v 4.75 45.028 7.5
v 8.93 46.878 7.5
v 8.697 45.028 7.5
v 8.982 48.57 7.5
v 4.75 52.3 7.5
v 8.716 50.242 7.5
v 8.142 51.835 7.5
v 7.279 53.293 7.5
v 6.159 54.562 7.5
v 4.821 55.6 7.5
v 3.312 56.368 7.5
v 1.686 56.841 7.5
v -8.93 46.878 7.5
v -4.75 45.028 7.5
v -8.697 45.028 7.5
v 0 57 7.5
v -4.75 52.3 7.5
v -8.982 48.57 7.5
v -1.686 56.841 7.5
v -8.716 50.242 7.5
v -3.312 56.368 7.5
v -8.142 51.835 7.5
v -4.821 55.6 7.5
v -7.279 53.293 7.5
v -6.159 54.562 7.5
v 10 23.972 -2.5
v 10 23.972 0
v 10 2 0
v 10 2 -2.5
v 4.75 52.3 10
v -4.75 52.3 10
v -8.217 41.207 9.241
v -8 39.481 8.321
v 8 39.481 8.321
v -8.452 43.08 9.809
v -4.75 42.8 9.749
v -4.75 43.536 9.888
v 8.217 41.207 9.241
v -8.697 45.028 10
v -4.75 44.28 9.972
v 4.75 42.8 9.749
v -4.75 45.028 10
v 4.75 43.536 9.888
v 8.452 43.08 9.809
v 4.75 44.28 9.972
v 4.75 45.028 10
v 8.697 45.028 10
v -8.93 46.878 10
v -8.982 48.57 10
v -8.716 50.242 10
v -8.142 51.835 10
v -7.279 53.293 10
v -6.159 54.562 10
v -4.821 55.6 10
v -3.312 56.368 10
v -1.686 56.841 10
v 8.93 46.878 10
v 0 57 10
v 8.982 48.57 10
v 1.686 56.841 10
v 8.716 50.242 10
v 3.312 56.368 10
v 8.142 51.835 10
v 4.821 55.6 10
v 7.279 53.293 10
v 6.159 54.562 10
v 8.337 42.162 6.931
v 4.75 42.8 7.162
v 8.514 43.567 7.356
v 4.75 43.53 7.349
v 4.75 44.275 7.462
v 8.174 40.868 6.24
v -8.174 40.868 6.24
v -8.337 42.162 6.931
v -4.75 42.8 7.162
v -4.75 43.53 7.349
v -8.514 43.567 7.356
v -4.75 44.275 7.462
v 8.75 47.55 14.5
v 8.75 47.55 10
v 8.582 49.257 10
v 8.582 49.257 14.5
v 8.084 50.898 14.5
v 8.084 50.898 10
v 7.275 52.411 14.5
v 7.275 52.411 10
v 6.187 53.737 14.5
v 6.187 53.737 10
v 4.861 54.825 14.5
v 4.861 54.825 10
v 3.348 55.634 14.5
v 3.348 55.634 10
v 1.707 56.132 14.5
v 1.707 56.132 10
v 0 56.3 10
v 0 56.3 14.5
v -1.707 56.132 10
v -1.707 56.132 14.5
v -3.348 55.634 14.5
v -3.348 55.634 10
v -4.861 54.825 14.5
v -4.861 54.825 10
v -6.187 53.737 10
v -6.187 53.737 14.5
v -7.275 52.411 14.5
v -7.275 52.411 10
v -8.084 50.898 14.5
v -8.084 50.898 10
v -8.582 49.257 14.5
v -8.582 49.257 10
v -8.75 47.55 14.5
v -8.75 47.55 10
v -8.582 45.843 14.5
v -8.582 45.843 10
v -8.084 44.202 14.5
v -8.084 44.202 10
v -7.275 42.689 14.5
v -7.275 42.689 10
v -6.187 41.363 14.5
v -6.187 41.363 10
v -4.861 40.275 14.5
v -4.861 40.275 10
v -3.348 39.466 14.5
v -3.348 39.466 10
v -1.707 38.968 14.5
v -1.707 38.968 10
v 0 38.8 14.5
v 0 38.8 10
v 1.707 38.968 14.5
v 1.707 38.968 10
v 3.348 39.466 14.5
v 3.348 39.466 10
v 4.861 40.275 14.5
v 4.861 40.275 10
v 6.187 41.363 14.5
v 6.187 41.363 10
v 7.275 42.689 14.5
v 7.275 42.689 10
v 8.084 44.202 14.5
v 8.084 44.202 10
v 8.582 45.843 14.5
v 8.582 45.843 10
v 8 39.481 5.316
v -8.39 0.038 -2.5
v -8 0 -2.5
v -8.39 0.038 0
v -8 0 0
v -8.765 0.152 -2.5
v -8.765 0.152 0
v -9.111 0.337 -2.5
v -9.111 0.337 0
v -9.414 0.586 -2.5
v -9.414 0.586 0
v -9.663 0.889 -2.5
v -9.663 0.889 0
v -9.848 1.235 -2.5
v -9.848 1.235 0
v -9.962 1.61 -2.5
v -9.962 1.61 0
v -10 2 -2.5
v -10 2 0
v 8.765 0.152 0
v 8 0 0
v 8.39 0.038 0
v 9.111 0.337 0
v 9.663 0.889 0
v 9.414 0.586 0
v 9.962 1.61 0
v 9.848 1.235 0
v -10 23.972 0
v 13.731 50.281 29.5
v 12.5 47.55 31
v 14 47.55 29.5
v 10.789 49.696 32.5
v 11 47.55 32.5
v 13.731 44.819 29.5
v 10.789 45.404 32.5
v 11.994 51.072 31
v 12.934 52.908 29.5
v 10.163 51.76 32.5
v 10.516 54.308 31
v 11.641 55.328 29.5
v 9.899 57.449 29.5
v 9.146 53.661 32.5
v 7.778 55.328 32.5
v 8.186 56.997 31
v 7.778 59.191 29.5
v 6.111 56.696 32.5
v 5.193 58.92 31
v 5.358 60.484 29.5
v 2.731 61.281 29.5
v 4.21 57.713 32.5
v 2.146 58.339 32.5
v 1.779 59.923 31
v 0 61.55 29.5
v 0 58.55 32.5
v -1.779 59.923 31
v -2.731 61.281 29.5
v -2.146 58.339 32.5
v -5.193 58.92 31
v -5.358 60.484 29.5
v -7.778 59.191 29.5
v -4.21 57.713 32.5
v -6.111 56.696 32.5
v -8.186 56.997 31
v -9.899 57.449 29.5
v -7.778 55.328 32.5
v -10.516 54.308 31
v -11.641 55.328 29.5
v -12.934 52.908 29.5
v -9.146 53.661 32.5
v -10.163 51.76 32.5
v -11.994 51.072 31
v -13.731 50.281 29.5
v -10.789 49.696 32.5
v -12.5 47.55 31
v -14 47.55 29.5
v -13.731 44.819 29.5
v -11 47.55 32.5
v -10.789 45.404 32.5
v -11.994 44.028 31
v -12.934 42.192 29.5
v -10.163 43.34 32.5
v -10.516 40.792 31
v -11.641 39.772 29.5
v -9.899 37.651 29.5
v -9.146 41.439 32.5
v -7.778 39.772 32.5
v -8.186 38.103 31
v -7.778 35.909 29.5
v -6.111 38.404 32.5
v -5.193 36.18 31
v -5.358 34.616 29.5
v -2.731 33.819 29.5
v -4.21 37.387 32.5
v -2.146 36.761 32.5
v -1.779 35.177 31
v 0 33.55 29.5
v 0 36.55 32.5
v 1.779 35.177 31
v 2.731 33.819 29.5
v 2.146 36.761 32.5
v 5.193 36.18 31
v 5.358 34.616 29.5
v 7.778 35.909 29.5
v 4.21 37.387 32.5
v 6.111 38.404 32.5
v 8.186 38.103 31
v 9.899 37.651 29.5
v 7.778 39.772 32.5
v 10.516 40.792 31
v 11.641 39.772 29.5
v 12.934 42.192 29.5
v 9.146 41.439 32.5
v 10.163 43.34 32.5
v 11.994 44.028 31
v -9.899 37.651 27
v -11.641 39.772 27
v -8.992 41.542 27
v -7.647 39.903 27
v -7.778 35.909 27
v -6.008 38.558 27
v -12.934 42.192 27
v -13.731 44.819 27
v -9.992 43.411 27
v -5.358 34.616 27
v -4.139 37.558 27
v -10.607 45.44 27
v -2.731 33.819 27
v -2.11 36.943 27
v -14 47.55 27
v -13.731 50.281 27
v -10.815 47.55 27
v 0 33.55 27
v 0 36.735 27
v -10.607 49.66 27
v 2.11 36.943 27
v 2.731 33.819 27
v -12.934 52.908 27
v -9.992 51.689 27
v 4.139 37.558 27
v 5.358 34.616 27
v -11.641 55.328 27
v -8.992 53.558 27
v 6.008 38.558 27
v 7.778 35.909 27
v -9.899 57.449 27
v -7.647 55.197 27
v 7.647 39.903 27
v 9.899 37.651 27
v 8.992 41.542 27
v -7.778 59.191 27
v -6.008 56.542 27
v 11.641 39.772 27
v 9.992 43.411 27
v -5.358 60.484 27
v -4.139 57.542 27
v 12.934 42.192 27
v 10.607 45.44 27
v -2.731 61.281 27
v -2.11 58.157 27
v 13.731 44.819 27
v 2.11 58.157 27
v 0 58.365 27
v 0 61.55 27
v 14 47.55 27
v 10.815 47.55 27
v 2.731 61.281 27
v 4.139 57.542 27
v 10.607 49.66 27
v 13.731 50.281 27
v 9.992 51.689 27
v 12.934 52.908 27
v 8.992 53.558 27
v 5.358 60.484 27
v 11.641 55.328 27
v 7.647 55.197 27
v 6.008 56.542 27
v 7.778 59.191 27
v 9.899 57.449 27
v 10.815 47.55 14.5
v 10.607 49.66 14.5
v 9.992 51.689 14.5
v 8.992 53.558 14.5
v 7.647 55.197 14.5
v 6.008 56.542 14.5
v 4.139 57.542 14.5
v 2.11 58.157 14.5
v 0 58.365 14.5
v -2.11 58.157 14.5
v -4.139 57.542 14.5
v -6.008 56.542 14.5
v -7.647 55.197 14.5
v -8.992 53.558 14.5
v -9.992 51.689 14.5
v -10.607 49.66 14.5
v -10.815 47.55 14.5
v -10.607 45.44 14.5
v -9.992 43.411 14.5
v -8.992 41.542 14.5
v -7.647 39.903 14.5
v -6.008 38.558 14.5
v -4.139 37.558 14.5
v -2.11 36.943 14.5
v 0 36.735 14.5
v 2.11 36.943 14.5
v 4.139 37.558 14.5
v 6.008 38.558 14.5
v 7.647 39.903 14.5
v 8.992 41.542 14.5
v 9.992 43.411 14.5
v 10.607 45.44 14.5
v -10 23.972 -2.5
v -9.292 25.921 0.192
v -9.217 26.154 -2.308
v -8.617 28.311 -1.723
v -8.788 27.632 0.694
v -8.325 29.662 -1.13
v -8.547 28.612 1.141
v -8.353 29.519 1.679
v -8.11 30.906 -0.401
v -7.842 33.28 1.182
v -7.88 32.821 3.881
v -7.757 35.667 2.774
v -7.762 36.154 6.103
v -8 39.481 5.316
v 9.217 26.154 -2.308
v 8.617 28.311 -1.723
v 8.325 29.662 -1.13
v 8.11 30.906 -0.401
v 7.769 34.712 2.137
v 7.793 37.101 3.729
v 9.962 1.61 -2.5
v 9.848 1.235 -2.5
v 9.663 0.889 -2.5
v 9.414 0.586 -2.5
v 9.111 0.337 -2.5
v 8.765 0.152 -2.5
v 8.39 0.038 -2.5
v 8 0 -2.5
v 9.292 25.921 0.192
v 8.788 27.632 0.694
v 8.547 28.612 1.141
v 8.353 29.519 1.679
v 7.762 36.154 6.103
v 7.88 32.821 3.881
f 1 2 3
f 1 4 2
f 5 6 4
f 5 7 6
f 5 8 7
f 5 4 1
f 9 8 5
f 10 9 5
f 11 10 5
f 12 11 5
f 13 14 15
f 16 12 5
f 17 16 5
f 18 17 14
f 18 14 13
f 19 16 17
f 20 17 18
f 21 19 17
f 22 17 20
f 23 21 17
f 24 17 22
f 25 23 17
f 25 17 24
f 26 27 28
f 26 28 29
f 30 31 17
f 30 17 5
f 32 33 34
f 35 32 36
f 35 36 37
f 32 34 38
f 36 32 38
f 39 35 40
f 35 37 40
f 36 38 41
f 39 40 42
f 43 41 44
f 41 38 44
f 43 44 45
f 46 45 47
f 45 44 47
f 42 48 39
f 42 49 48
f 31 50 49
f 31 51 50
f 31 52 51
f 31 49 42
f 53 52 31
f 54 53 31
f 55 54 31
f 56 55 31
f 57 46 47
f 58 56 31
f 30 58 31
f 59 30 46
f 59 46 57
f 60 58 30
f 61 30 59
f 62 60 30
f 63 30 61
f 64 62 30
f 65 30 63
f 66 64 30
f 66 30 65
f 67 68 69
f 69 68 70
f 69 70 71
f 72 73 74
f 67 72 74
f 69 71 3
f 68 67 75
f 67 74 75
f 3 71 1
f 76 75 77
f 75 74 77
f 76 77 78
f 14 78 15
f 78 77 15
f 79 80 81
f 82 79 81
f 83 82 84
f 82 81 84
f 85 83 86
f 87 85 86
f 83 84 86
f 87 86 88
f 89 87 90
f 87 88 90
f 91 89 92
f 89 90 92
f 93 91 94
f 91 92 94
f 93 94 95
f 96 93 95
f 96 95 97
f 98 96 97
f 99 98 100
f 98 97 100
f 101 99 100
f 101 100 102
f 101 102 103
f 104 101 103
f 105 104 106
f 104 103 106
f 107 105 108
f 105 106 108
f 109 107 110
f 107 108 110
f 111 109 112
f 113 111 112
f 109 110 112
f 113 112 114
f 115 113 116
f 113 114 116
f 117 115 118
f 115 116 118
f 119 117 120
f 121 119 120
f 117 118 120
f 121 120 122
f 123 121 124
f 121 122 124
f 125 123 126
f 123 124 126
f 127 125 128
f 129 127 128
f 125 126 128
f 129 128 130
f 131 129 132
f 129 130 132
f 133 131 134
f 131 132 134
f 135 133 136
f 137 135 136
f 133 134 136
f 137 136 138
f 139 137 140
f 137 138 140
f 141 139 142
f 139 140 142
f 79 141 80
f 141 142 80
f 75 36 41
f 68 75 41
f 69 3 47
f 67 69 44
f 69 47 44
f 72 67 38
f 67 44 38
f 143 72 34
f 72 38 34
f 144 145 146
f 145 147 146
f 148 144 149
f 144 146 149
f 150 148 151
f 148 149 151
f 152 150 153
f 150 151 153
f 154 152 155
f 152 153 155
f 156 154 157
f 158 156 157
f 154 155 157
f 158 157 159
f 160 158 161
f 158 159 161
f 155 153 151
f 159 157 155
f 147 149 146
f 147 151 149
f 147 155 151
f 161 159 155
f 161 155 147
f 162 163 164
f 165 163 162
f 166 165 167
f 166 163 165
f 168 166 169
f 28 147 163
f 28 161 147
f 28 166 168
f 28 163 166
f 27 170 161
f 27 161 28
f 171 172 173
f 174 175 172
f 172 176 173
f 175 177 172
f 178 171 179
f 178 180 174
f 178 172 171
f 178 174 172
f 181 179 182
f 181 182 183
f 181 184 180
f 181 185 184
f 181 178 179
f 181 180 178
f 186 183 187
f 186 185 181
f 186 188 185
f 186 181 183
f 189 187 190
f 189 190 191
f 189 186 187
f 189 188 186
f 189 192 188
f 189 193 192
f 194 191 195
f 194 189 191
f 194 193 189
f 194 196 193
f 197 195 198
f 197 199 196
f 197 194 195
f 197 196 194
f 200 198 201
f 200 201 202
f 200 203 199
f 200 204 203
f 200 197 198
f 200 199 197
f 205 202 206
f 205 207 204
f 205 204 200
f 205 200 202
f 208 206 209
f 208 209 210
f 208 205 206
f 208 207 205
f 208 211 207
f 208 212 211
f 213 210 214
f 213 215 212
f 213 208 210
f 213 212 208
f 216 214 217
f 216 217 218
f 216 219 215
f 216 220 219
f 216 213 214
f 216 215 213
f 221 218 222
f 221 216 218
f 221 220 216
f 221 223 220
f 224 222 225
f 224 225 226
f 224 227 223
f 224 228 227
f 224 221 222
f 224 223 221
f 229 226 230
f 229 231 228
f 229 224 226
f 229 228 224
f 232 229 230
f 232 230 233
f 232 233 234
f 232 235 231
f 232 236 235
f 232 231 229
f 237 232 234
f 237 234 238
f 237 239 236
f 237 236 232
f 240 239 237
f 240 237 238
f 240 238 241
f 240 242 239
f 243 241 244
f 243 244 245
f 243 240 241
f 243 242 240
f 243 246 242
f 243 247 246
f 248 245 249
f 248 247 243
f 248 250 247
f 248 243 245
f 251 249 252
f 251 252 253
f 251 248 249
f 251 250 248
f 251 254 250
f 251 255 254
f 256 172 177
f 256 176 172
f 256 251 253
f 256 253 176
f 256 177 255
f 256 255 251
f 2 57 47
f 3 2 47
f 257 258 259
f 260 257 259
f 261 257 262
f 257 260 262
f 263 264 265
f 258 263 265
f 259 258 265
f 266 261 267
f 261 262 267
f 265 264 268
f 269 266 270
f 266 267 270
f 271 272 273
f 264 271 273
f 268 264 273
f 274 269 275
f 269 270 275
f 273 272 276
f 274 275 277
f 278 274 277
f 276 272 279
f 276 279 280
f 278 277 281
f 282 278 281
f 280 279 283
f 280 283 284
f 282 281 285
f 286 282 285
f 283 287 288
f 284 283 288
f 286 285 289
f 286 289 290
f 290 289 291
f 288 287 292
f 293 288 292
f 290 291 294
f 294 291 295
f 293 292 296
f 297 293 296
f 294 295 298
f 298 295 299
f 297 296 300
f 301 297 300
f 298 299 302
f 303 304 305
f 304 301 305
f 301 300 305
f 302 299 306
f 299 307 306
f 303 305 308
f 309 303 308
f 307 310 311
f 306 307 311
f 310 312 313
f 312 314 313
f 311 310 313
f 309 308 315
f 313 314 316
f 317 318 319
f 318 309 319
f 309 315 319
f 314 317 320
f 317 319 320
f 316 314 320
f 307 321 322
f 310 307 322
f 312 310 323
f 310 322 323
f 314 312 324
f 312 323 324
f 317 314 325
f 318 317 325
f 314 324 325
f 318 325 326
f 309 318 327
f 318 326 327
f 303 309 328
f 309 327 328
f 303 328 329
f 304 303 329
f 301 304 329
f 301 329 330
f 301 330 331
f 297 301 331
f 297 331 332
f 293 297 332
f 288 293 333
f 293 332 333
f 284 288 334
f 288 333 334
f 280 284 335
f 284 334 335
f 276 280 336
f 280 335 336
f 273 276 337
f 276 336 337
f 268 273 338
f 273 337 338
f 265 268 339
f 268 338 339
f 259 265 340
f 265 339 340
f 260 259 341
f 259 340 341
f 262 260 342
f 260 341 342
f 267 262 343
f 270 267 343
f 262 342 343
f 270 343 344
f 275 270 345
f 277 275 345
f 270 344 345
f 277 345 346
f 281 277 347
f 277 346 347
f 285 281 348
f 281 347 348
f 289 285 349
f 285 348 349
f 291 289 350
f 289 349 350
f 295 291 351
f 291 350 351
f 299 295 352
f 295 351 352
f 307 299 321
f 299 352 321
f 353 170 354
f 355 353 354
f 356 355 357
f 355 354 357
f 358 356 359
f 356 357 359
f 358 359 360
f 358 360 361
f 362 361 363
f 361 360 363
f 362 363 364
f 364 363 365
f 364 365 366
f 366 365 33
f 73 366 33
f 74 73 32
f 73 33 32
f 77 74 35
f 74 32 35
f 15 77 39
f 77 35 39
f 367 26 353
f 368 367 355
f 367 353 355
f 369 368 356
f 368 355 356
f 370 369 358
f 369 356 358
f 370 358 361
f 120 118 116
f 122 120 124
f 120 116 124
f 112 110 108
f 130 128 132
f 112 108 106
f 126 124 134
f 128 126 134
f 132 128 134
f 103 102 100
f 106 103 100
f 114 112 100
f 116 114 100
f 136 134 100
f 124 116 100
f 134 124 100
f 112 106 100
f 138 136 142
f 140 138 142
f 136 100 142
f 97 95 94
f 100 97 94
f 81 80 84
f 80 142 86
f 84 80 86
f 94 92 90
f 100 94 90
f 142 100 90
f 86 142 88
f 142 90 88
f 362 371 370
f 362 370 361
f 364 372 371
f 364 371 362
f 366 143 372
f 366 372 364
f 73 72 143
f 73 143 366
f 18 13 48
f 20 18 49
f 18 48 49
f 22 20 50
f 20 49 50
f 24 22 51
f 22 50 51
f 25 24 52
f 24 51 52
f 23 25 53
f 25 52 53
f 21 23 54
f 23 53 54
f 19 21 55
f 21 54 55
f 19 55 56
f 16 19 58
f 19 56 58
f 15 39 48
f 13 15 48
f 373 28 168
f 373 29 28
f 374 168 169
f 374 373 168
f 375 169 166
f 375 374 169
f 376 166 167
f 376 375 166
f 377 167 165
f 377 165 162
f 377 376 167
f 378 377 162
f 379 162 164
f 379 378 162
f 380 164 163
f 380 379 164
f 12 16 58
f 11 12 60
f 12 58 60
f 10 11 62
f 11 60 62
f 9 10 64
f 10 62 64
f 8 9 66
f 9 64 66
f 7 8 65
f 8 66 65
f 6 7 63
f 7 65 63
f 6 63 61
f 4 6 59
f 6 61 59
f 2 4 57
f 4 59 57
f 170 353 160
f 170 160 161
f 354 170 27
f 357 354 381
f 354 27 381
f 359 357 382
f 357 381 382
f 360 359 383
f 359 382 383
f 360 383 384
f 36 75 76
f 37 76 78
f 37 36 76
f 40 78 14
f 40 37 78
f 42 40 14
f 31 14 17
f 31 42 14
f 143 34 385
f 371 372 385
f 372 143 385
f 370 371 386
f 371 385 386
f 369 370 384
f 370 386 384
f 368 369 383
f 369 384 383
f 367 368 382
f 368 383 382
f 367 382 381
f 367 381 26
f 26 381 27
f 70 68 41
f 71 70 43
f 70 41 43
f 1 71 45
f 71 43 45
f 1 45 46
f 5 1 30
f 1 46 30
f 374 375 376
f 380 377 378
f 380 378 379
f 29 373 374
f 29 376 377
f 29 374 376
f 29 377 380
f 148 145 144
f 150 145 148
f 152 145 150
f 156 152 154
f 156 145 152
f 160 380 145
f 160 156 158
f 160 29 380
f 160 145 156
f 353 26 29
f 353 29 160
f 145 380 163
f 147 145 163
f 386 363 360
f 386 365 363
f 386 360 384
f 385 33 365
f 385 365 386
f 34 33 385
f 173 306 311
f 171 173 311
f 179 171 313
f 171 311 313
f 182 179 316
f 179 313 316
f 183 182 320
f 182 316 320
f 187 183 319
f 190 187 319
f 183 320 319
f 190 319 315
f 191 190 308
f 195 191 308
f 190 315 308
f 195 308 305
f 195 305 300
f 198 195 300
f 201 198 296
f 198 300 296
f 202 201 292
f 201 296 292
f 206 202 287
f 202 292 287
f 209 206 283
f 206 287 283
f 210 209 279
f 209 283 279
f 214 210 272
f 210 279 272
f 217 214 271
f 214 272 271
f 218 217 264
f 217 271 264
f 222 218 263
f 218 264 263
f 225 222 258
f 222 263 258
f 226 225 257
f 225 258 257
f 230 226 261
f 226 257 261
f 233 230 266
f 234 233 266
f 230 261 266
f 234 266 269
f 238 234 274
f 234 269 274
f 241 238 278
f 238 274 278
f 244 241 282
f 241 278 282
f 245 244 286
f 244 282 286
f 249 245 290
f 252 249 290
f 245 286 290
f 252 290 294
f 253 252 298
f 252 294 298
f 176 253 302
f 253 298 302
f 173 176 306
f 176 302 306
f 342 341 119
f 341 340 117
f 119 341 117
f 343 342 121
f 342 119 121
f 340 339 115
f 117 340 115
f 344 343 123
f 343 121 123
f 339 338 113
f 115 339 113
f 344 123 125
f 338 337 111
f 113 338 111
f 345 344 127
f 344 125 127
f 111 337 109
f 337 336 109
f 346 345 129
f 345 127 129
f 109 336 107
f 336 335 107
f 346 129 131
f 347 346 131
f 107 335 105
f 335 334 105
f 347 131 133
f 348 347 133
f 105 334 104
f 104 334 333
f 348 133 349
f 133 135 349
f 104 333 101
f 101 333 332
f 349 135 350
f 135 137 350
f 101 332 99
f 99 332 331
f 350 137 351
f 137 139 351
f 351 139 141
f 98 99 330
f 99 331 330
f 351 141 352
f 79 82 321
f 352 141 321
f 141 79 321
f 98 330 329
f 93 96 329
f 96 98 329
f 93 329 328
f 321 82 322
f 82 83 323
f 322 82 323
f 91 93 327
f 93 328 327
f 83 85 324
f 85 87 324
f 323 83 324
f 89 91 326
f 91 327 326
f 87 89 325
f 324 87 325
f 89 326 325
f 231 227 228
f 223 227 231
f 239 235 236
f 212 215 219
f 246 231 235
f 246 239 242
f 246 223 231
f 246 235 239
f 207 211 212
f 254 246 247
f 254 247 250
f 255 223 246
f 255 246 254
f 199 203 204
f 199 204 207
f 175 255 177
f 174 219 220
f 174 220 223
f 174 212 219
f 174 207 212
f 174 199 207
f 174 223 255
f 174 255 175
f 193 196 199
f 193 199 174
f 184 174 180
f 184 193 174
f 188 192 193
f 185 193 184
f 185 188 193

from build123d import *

# Parameters (mm, degrees)
SKETCH6_W           = 20
SKETCH6_H           = 2.5
CUT_EXTRUDE7_DEPTH  = 60.205151803
FILLET1_R           = 2
SKETCH19_W          = 9.5
SKETCH19_H          = 9.5
CUT_EXTRUDE8_DEPTH  = 60.205151841
SKETCH20_R          = 8.75
BOSS_EXTRUDE1_DEPTH = 4.5
SKETCH21_R          = 10.815
BOSS_EXTRUDE2_DEPTH = 12.5
SKETCH22_R          = 14
BOSS_EXTRUDE3_DEPTH = 5.5
CHAMFER1_SIZE       = 3


with BuildPart() as part:
    # Sweep1: sweep along a path in Sketch1
    with BuildLine(Plane.YZ) as sweep1_path:
        Line((0, 0), (23.972243623, 0))
        ThreePointArc((23.972243623, 0), (26.87008511, 0.429079735), (29.519245585, 1.679497057))
        Line((29.519245585, 1.679497057), (39.480754415, 8.320502943))
        ThreePointArc((39.480754415, 8.320502943), (42.12991489, 9.570920265), (45.027756377, 10))
        Line((45.027756377, 10), (57, 10))
    # Sketch6 → Sweep1 (sweep)
    with BuildSketch(Plane(origin=(0, 0, 0), x_dir=(-1, 0, 0), z_dir=(0, 1, 0))):
        with Locations((0, -1.25)):
            Rectangle(SKETCH6_W, SKETCH6_H)
    sweep(path=sweep1_path.line)

    # Sketch18 → Cut-Extrude7 (cut, through all)
    with BuildSketch(Plane.XY.offset(10)):
        with BuildLine():
            Line((10, 57), (0, 57))
            ThreePointArc((0, 57), (6.749137532, 53.953918254), (8.929736256, 46.877587239))
            Line((8.929736256, 46.877587239), (8.697223928, 45.027756377))
            Line((8.697223928, 45.027756377), (10, 45.027756377))
            Line((10, 45.027756377), (10, 57))
        make_face()
        with BuildLine():
            Line((10, 45.027756377), (8.697223928, 45.027756377))
            Line((8.697223928, 45.027756377), (8, 39.480754415))
            ThreePointArc((8, 39.480754415), (8.012671559, 31.599171714), (10, 23.972243623))
            Line((10, 23.972243623), (10, 45.027756377))
        make_face()
        with BuildLine():
            Line((-8.697223928, 45.027756377), (-8.929736256, 46.877587239))
            ThreePointArc((-8.929736256, 46.877587239), (-6.749137532, 53.953918254), (0, 57))
            Line((0, 57), (-10, 57))
            Line((-10, 57), (-10, 45.027756377))
            Line((-10, 45.027756377), (-8.697223928, 45.027756377))
        make_face()
        with BuildLine():
            Line((-8, 39.480754415), (-8.697223928, 45.027756377))
            Line((-8.697223928, 45.027756377), (-10, 45.027756377))
            Line((-10, 45.027756377), (-10, 23.972243623))
            ThreePointArc((-10, 23.972243623), (-8.012671559, 31.599171714), (-8, 39.480754415))
        make_face()
    extrude(amount=-CUT_EXTRUDE7_DEPTH, mode=Mode.SUBTRACT)

    # Fillet1
    fillet1_edges = [part.edges().sort_by_distance(p)[0] for p in [
        (-10, 0, -1.25),
        (10, 0, -1.25),
    ]]
    fillet(fillet1_edges, radius=FILLET1_R)

    # Sketch19 → Cut-Extrude8 (cut, through all)
    with BuildSketch(Plane.XY.offset(10)):
        with Locations((0, 47.55)):
            Rectangle(SKETCH19_W, SKETCH19_H)
    extrude(amount=-CUT_EXTRUDE8_DEPTH, mode=Mode.SUBTRACT)


with BuildPart() as body_2:
    # Sketch20 → Boss-Extrude1 (new body)
    with BuildSketch(Plane.XY.offset(10)):
        with Locations((0, 47.55)):
            Circle(SKETCH20_R)
    extrude(amount=BOSS_EXTRUDE1_DEPTH)

    # Sketch21 → Boss-Extrude2 (add)
    with BuildSketch(Plane(origin=(0, 0, 14.5), x_dir=(0, -1, 0), z_dir=(0, 0, 1))):
        with Locations(Location((-47.55, 0, 0), (0, 0, 90))):
            Circle(SKETCH21_R)
    extrude(amount=BOSS_EXTRUDE2_DEPTH)

    # Sketch22 → Boss-Extrude3 (add)
    with BuildSketch(Plane.XY.offset(27)):
        with Locations((0, 47.55)):
            Circle(SKETCH22_R)
    extrude(amount=BOSS_EXTRUDE3_DEPTH)

    # Chamfer1
    chamfer1_edges = [body_2.edges().sort_by_distance(p)[0] for p in [
        (-14, 47.55, 32.5),
    ]]
    chamfer(chamfer1_edges, length=CHAMFER1_SIZE)


solid = Compound([part.part, body_2.part])
